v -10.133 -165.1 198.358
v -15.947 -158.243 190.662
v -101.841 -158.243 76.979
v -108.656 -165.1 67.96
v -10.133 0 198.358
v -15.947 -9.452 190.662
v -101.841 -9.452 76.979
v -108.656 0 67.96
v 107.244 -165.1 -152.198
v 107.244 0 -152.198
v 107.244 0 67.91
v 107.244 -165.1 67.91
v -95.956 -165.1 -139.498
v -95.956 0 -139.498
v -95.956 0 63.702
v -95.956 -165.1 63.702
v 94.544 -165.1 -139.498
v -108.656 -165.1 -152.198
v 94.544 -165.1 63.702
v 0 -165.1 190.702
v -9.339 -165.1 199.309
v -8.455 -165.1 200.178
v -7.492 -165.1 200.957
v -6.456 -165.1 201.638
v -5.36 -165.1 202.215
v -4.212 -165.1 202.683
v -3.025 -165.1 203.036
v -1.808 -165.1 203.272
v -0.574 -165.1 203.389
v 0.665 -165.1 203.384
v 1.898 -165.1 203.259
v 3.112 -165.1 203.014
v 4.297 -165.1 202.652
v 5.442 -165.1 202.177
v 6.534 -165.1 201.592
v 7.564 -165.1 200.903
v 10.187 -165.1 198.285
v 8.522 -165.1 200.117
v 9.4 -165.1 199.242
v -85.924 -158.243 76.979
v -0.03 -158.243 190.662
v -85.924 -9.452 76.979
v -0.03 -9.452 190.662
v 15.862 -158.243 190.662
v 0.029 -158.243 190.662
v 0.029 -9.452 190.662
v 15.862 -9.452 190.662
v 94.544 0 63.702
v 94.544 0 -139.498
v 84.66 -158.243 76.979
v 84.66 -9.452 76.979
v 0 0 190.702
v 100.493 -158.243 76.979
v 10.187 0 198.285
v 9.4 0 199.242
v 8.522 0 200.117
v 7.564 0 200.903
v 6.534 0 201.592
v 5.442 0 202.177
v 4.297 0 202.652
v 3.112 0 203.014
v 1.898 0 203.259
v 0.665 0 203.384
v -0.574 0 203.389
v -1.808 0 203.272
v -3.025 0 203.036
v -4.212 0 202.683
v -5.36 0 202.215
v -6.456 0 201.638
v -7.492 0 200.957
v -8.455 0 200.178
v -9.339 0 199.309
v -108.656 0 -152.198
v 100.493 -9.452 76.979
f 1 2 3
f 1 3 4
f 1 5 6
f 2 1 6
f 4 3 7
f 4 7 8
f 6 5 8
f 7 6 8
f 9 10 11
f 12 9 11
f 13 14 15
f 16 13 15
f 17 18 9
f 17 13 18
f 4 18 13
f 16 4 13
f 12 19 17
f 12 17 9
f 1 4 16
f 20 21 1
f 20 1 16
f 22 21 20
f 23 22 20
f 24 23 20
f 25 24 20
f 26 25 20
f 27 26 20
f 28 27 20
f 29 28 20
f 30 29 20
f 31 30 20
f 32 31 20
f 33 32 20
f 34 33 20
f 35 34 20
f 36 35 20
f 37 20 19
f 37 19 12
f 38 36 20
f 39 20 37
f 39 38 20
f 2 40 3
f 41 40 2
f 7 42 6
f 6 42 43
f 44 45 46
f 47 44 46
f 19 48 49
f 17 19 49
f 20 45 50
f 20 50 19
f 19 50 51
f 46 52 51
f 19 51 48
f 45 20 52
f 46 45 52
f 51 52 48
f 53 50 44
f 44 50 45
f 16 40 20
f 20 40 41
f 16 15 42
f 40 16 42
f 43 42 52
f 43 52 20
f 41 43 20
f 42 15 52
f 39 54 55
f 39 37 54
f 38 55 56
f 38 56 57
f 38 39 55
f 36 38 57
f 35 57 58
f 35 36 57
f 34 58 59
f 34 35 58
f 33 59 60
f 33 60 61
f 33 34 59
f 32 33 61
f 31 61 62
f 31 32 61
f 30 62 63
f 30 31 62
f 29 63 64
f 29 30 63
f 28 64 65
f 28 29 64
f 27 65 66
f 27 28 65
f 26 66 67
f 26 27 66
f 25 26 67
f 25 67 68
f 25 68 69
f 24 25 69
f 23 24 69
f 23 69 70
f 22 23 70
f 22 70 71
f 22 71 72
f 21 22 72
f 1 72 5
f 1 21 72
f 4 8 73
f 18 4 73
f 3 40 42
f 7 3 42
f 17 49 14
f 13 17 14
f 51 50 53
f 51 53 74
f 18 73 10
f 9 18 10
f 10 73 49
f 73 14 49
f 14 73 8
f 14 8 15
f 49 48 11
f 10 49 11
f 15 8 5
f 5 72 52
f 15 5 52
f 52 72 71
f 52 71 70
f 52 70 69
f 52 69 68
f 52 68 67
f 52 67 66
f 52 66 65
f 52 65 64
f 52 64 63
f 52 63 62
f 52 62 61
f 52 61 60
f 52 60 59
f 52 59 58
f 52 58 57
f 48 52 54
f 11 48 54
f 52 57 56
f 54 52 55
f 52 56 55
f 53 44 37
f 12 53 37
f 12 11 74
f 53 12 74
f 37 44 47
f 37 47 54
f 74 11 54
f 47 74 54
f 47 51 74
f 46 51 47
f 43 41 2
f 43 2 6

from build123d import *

# Parameters (mm, degrees)
F1_DEPTH      = 165.1
F2_R          = 12.7
F3_W          = 148.7911092117
F3_H          = 113.6830970645
F4_DEPTH      = 168.43995
F4_DEPTH_BACK = 150.70774


with BuildPart() as f1:
    # F0 (on Front) → F1 (new body)
    with BuildSketch(Plane.XZ):
        Polygon((107.244443667, 67.909792846), (0.0752603531, 211.8683984813), (-108.655556333, 67.959965798), (-108.655556333, -152.1984019804), (107.244443667, -152.1984019804), align=None)
        Polygon((94.544443667, -139.4984019804), (-95.955556333, -139.4984019804), (-95.955556333, 63.7015980196), (0, 190.7015980196), (94.544443667, 63.7015980196), align=None, mode=Mode.SUBTRACT)
    extrude(amount=F1_DEPTH)

    # F2
    f2_edges = [f1.edges().sort_by_distance(p)[0] for p in [
        (0.07526, -82.55, 211.868398),
    ]]
    fillet(f2_edges, radius=F2_R)

    # F3 (on Right) → F4 (cut, two sides)
    with BuildSketch(Plane.YZ) as f4_sk:
        with Locations((-83.8478184305, 133.8204629719)):
            Rectangle(F3_W, F3_H)
    extrude(amount=-F4_DEPTH, mode=Mode.SUBTRACT)
    extrude(f4_sk.sketch, amount=F4_DEPTH_BACK, mode=Mode.SUBTRACT)


solid = f1.part
